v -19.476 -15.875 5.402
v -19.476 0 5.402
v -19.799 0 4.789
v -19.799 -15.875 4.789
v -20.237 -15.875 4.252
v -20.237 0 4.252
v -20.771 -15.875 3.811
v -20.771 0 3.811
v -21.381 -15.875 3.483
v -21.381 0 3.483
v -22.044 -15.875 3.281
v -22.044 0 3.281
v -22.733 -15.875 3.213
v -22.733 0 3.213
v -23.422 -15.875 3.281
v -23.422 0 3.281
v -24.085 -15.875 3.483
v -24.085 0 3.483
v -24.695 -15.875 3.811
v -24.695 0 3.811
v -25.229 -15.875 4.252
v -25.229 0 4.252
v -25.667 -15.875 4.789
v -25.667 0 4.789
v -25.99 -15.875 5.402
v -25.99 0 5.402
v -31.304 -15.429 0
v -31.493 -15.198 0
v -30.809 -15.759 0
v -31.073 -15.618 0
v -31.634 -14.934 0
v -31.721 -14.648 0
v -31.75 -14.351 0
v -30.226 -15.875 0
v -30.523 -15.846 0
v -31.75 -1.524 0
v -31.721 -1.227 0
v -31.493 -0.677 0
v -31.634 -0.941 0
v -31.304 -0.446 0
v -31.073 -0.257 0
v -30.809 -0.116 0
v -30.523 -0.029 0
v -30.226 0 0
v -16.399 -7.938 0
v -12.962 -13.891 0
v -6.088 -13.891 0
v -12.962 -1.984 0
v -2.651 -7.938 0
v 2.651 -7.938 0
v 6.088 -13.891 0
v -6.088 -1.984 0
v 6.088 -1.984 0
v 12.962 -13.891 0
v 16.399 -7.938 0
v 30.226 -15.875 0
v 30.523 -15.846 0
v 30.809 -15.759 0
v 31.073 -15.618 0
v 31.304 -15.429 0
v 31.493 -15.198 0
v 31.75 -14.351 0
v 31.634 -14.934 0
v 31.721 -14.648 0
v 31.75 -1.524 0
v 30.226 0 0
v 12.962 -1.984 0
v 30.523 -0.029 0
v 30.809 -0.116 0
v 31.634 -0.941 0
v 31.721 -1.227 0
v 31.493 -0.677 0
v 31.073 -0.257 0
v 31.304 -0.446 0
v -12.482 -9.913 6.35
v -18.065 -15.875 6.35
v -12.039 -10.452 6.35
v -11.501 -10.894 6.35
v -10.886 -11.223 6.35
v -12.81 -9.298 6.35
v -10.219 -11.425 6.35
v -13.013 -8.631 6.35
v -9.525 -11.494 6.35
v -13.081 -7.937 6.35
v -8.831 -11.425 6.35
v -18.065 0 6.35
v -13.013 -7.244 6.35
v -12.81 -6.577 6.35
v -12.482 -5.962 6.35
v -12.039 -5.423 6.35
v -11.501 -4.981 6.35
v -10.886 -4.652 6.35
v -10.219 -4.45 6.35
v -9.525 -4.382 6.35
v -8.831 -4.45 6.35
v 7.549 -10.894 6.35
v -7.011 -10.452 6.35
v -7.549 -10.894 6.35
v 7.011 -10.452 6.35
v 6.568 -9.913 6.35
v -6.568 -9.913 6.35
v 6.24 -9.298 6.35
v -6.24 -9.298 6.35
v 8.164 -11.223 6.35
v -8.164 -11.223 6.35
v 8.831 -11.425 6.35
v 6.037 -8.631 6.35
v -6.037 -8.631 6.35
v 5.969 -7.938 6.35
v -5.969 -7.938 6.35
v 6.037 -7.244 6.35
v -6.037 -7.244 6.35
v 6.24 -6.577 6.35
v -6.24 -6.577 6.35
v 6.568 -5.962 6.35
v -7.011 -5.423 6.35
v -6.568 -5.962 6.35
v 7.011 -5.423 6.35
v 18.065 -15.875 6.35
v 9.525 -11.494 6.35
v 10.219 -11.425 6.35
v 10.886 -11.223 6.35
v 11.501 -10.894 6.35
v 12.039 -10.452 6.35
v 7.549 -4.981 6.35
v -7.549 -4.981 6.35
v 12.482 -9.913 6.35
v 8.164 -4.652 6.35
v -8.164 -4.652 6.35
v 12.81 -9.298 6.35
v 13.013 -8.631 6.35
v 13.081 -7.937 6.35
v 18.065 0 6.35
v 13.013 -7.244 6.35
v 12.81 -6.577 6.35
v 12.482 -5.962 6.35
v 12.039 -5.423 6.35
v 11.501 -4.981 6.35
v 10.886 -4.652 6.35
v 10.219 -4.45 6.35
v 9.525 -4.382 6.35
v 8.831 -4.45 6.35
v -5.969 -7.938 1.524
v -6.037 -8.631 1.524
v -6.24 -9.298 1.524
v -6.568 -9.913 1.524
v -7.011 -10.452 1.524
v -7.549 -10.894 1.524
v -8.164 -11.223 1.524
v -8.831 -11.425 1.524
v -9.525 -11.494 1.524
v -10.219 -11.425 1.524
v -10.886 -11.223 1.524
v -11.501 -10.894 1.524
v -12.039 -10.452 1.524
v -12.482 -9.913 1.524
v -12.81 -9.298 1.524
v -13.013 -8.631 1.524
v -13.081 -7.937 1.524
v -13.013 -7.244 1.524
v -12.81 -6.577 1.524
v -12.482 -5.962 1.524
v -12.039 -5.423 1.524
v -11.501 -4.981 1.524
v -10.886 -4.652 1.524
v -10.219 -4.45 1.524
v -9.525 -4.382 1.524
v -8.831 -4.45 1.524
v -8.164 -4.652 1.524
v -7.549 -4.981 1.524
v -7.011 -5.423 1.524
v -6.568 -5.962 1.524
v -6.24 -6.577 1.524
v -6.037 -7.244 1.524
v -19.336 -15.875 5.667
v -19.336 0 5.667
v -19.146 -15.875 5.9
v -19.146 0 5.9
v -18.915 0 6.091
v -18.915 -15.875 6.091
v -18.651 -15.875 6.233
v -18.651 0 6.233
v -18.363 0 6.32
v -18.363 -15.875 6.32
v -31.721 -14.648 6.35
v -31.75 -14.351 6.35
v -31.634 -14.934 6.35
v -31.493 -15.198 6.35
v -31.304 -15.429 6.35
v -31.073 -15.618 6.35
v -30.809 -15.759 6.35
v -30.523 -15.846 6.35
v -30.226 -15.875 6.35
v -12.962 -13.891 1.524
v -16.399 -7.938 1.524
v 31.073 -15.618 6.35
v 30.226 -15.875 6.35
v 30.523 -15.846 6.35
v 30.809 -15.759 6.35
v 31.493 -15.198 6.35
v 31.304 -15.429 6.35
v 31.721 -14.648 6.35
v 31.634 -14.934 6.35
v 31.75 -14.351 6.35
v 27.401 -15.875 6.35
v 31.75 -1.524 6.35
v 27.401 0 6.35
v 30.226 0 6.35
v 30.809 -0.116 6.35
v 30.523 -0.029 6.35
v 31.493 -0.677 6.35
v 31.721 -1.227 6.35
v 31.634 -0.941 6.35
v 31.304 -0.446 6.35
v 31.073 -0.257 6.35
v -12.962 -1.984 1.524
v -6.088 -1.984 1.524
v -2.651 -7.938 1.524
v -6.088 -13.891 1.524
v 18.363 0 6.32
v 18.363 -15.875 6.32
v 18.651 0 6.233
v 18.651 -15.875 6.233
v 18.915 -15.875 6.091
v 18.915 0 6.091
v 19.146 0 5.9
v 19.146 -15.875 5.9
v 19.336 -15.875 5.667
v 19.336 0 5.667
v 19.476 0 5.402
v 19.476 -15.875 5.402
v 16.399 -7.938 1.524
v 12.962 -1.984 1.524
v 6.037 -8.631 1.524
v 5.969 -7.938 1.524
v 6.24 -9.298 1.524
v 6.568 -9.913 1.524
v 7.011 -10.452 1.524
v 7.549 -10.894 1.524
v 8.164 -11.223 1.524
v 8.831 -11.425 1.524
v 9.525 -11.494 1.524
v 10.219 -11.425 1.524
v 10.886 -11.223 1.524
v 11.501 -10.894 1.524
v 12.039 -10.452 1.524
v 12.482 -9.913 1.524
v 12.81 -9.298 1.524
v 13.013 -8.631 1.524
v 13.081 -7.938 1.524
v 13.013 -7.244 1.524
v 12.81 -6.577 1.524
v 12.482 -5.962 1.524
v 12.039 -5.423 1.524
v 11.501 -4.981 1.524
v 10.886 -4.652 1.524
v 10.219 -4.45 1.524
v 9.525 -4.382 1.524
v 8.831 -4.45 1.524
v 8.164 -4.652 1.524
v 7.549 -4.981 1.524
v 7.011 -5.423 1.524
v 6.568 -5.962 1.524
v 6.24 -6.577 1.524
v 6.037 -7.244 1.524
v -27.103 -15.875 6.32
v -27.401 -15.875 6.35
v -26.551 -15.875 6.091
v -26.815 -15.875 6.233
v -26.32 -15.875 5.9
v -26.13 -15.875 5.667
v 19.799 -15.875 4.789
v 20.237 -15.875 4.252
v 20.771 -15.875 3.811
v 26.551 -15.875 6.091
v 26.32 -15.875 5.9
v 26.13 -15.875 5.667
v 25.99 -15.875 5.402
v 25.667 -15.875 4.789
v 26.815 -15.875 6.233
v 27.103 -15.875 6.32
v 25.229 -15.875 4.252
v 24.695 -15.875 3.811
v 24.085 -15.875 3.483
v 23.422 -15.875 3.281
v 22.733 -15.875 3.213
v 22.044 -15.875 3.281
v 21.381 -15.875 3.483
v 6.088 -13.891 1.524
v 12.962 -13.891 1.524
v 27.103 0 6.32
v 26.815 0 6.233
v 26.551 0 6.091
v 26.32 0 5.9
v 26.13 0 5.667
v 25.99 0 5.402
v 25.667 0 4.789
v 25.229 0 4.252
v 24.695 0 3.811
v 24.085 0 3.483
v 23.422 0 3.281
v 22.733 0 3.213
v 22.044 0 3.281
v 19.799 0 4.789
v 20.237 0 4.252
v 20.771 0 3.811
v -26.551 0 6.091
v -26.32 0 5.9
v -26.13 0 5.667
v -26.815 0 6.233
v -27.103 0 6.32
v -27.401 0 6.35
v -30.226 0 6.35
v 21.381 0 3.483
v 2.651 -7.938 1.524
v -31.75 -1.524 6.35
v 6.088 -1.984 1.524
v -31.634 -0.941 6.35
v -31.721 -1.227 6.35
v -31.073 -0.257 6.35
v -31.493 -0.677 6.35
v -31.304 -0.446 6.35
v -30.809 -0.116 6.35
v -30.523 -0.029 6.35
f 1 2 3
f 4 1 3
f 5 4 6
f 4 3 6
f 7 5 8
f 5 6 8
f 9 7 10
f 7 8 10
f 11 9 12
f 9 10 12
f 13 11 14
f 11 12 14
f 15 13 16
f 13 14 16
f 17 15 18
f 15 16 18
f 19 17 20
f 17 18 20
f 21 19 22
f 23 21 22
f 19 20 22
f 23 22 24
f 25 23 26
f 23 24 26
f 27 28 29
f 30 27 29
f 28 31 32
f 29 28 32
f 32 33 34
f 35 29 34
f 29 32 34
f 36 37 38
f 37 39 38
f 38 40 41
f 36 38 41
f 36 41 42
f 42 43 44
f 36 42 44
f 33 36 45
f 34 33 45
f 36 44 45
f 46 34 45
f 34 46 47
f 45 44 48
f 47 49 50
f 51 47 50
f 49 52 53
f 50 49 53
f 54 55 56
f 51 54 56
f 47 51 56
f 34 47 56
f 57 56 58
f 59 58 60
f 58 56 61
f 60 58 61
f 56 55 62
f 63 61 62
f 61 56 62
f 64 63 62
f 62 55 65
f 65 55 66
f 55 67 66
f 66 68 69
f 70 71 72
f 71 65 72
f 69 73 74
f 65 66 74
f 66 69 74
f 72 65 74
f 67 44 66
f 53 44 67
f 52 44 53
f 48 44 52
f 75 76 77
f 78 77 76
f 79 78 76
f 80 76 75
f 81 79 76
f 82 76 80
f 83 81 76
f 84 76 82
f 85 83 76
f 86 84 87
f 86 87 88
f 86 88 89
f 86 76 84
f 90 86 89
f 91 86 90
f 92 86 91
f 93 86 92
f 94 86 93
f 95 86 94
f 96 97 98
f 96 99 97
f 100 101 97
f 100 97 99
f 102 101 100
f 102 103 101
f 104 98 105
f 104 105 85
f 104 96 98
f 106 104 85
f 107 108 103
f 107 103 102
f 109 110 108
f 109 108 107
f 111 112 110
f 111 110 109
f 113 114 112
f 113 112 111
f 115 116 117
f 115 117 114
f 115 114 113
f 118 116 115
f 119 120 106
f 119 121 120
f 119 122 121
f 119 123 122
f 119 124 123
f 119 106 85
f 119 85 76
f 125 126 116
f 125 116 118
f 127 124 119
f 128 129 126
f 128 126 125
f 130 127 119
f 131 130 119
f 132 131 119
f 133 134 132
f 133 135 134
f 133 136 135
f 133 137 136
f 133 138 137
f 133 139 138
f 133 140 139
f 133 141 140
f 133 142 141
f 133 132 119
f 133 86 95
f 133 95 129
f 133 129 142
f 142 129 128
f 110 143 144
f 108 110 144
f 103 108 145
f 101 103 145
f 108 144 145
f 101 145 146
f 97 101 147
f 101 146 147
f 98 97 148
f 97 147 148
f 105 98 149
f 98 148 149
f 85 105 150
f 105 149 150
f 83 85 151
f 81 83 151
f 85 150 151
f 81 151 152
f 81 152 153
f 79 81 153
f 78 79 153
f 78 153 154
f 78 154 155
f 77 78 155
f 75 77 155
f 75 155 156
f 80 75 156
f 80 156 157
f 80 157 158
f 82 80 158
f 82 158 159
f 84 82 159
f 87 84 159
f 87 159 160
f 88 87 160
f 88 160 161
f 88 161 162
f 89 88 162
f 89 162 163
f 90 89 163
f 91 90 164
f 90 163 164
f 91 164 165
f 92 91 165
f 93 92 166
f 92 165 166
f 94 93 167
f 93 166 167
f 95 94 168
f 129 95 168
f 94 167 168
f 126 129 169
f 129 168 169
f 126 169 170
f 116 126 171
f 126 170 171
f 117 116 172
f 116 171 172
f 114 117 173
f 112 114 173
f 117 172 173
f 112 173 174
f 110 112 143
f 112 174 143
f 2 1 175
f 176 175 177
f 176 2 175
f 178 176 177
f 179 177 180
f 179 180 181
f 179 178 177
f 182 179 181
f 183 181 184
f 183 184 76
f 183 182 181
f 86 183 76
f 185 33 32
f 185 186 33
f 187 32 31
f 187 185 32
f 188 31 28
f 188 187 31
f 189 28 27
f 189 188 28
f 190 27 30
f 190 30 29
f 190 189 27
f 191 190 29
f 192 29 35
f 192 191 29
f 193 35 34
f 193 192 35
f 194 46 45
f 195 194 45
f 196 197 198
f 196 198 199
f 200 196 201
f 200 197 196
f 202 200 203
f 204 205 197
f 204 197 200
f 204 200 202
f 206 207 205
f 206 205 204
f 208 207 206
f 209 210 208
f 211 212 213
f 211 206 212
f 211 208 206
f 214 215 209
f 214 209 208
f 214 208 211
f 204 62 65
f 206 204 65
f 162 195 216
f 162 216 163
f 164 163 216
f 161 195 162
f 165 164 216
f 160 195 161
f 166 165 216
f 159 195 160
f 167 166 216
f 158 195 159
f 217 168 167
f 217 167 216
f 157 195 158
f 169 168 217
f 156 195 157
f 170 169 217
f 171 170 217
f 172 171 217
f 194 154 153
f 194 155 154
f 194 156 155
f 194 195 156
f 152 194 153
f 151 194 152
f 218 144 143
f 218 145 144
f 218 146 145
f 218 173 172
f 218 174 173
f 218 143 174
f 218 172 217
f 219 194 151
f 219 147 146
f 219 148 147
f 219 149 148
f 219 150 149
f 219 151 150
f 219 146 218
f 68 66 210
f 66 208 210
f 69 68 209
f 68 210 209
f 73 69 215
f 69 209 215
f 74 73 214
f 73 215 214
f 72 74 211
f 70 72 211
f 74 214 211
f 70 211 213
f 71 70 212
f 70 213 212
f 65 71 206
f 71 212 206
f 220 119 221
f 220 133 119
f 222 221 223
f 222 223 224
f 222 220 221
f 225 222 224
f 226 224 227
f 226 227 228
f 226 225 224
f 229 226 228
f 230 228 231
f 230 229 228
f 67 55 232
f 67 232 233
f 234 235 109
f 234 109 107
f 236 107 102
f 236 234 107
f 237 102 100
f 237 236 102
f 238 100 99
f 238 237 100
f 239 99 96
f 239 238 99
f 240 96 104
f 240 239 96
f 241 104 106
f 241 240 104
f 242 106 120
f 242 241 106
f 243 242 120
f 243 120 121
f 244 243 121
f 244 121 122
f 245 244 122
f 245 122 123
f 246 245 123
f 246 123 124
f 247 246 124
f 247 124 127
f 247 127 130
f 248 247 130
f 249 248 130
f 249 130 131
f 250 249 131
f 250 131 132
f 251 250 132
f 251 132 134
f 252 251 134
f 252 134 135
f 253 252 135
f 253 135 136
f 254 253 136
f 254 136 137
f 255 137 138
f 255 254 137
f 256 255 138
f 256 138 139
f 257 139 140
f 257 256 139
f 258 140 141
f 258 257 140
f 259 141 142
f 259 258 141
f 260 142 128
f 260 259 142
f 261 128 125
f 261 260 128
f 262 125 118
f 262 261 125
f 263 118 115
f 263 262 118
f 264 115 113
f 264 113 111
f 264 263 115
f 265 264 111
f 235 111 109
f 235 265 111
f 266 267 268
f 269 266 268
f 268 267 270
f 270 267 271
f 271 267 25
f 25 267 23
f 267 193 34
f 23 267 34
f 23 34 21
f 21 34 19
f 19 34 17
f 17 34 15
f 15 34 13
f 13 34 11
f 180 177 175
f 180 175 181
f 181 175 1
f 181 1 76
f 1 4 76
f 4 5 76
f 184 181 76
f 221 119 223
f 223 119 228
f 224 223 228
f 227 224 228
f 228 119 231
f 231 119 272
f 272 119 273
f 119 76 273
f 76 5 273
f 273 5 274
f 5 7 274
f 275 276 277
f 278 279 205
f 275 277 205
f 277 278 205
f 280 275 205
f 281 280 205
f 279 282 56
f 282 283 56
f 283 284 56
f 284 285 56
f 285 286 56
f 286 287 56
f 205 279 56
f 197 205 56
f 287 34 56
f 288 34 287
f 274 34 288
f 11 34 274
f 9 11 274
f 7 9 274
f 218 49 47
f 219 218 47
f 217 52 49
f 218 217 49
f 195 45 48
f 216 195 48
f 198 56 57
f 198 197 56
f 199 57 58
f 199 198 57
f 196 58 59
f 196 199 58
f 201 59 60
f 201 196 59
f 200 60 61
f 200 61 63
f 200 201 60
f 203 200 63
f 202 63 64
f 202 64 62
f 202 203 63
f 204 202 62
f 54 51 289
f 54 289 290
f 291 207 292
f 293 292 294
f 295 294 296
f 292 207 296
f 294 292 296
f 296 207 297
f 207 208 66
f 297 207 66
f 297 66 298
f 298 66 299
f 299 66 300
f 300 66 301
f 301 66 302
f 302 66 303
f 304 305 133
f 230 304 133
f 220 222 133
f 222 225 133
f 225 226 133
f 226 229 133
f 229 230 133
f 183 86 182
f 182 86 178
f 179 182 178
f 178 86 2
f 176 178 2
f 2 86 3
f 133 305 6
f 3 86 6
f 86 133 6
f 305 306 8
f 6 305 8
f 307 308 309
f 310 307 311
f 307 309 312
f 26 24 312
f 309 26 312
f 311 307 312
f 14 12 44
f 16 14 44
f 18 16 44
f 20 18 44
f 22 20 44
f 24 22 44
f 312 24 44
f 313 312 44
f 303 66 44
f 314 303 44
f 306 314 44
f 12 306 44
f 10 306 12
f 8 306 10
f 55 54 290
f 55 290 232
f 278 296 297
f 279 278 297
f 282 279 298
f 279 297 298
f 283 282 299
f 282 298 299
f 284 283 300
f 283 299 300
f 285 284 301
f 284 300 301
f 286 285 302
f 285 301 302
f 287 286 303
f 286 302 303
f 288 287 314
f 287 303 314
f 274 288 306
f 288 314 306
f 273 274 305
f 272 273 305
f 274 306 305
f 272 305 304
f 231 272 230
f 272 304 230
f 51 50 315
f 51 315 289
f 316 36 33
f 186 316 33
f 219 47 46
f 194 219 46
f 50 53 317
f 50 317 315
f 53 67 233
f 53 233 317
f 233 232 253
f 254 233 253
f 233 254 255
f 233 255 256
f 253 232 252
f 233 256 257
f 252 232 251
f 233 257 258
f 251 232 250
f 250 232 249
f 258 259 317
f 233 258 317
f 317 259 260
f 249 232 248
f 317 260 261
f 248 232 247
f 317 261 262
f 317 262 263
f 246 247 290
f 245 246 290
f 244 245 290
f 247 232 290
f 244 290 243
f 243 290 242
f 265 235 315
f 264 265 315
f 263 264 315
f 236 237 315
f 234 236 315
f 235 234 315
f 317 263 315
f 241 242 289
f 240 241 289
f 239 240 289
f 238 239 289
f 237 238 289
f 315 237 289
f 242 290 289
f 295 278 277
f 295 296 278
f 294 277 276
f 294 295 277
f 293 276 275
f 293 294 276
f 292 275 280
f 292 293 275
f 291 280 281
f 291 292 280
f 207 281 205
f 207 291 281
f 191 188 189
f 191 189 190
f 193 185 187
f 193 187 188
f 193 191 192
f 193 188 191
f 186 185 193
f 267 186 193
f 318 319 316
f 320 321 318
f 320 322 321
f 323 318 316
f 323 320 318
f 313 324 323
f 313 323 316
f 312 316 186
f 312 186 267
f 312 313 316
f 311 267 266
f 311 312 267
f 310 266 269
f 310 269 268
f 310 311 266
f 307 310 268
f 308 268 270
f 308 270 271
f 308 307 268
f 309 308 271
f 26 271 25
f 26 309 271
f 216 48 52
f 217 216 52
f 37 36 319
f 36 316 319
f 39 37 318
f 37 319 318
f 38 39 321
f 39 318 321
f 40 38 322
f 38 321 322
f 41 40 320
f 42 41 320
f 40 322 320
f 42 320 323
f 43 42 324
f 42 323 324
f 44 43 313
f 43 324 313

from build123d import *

# Parameters (mm, degrees)
F1_DEPTH = 6.35
F2_R     = 3.5179
F3_DEPTH = 15.876
F4_R     = 1.524
F5_R     = 3.556
F6_DEPTH = 6.35
F8_DEPTH = 1.524


# Not quite as in the source:
# - a pattern or mirror of a feature is missing from the dataset's text; its kind, count and spacing are read off the source's solid


with BuildPart() as f1:
    # F0 (on Top) → F1 (new body)
    with BuildSketch(Plane.XY):
        Polygon((0, 0), (-31.75, 0), (-31.75, -15.875), (0, -15.875), (31.75, -15.875), (31.75, 0), align=None)
    extrude(amount=F1_DEPTH)

    # F2 (on face) → F3 (cut, through all)
    with BuildSketch(Plane(origin=(0, 0, 0), x_dir=(-1, 0, 0), z_dir=(0, 1, 0))):
        with Locations((-22.733, 6.731)):
            Circle(F2_R)
        with Locations((22.733, 6.731)):
            Circle(F2_R)
    extrude(amount=-F3_DEPTH, mode=Mode.SUBTRACT)

    # F4
    f4_edges = [f1.edges().sort_by_distance(p)[0] for p in [
        (31.75, 0, 3.175),
        (31.75, -15.875, 3.175),
        (-31.75, 0, 3.175),
        (-31.75, -15.875, 3.175),
        (19.235793, -7.9375, 6.35),
        (26.230207, -7.9375, 6.35),
        (-26.230207, -7.9375, 6.35),
        (-19.235793, -7.9375, 6.35),
    ]]
    fillet(f4_edges, radius=F4_R)

    # F5 (on face) → F6 (cut, through all)
    with BuildSketch(Plane(origin=(0, 0, 0), x_dir=(1, 0, 0), z_dir=(0, 0, -1))):
        with Locations((-9.525, 7.9375)):
            Circle(F5_R)
    f6 = extrude(amount=-F6_DEPTH, mode=Mode.SUBTRACT)

    # F6_copies: F6 across plane
    add(f6.mirror(Plane(origin=(0, 0, 0), x_dir=(0, 0, 1), z_dir=(1, 0, 0))), mode=Mode.SUBTRACT)

    # F7 (on face) → F8 (cut)
    with BuildSketch(Plane(origin=(0, 0, 0), x_dir=(1, 0, 0), z_dir=(0, 0, -1))):
        Polygon((-9.525, 1.984375), (-6.0879616787, 1.984375), (-2.6509233575, 7.9375), (-6.0879616787, 13.890625), (-9.525, 13.890625), (-12.9620383213, 13.890625), (-16.3990766425, 7.9375), (-12.9620383213, 1.984375), align=None)
    f8 = extrude(amount=-F8_DEPTH, mode=Mode.SUBTRACT)

    # F8_copies: F8 across plane
    add(f8.mirror(Plane(origin=(0, 0, 0), x_dir=(0, 0, 1), z_dir=(1, 0, 0))), mode=Mode.SUBTRACT)


solid = f1.part
